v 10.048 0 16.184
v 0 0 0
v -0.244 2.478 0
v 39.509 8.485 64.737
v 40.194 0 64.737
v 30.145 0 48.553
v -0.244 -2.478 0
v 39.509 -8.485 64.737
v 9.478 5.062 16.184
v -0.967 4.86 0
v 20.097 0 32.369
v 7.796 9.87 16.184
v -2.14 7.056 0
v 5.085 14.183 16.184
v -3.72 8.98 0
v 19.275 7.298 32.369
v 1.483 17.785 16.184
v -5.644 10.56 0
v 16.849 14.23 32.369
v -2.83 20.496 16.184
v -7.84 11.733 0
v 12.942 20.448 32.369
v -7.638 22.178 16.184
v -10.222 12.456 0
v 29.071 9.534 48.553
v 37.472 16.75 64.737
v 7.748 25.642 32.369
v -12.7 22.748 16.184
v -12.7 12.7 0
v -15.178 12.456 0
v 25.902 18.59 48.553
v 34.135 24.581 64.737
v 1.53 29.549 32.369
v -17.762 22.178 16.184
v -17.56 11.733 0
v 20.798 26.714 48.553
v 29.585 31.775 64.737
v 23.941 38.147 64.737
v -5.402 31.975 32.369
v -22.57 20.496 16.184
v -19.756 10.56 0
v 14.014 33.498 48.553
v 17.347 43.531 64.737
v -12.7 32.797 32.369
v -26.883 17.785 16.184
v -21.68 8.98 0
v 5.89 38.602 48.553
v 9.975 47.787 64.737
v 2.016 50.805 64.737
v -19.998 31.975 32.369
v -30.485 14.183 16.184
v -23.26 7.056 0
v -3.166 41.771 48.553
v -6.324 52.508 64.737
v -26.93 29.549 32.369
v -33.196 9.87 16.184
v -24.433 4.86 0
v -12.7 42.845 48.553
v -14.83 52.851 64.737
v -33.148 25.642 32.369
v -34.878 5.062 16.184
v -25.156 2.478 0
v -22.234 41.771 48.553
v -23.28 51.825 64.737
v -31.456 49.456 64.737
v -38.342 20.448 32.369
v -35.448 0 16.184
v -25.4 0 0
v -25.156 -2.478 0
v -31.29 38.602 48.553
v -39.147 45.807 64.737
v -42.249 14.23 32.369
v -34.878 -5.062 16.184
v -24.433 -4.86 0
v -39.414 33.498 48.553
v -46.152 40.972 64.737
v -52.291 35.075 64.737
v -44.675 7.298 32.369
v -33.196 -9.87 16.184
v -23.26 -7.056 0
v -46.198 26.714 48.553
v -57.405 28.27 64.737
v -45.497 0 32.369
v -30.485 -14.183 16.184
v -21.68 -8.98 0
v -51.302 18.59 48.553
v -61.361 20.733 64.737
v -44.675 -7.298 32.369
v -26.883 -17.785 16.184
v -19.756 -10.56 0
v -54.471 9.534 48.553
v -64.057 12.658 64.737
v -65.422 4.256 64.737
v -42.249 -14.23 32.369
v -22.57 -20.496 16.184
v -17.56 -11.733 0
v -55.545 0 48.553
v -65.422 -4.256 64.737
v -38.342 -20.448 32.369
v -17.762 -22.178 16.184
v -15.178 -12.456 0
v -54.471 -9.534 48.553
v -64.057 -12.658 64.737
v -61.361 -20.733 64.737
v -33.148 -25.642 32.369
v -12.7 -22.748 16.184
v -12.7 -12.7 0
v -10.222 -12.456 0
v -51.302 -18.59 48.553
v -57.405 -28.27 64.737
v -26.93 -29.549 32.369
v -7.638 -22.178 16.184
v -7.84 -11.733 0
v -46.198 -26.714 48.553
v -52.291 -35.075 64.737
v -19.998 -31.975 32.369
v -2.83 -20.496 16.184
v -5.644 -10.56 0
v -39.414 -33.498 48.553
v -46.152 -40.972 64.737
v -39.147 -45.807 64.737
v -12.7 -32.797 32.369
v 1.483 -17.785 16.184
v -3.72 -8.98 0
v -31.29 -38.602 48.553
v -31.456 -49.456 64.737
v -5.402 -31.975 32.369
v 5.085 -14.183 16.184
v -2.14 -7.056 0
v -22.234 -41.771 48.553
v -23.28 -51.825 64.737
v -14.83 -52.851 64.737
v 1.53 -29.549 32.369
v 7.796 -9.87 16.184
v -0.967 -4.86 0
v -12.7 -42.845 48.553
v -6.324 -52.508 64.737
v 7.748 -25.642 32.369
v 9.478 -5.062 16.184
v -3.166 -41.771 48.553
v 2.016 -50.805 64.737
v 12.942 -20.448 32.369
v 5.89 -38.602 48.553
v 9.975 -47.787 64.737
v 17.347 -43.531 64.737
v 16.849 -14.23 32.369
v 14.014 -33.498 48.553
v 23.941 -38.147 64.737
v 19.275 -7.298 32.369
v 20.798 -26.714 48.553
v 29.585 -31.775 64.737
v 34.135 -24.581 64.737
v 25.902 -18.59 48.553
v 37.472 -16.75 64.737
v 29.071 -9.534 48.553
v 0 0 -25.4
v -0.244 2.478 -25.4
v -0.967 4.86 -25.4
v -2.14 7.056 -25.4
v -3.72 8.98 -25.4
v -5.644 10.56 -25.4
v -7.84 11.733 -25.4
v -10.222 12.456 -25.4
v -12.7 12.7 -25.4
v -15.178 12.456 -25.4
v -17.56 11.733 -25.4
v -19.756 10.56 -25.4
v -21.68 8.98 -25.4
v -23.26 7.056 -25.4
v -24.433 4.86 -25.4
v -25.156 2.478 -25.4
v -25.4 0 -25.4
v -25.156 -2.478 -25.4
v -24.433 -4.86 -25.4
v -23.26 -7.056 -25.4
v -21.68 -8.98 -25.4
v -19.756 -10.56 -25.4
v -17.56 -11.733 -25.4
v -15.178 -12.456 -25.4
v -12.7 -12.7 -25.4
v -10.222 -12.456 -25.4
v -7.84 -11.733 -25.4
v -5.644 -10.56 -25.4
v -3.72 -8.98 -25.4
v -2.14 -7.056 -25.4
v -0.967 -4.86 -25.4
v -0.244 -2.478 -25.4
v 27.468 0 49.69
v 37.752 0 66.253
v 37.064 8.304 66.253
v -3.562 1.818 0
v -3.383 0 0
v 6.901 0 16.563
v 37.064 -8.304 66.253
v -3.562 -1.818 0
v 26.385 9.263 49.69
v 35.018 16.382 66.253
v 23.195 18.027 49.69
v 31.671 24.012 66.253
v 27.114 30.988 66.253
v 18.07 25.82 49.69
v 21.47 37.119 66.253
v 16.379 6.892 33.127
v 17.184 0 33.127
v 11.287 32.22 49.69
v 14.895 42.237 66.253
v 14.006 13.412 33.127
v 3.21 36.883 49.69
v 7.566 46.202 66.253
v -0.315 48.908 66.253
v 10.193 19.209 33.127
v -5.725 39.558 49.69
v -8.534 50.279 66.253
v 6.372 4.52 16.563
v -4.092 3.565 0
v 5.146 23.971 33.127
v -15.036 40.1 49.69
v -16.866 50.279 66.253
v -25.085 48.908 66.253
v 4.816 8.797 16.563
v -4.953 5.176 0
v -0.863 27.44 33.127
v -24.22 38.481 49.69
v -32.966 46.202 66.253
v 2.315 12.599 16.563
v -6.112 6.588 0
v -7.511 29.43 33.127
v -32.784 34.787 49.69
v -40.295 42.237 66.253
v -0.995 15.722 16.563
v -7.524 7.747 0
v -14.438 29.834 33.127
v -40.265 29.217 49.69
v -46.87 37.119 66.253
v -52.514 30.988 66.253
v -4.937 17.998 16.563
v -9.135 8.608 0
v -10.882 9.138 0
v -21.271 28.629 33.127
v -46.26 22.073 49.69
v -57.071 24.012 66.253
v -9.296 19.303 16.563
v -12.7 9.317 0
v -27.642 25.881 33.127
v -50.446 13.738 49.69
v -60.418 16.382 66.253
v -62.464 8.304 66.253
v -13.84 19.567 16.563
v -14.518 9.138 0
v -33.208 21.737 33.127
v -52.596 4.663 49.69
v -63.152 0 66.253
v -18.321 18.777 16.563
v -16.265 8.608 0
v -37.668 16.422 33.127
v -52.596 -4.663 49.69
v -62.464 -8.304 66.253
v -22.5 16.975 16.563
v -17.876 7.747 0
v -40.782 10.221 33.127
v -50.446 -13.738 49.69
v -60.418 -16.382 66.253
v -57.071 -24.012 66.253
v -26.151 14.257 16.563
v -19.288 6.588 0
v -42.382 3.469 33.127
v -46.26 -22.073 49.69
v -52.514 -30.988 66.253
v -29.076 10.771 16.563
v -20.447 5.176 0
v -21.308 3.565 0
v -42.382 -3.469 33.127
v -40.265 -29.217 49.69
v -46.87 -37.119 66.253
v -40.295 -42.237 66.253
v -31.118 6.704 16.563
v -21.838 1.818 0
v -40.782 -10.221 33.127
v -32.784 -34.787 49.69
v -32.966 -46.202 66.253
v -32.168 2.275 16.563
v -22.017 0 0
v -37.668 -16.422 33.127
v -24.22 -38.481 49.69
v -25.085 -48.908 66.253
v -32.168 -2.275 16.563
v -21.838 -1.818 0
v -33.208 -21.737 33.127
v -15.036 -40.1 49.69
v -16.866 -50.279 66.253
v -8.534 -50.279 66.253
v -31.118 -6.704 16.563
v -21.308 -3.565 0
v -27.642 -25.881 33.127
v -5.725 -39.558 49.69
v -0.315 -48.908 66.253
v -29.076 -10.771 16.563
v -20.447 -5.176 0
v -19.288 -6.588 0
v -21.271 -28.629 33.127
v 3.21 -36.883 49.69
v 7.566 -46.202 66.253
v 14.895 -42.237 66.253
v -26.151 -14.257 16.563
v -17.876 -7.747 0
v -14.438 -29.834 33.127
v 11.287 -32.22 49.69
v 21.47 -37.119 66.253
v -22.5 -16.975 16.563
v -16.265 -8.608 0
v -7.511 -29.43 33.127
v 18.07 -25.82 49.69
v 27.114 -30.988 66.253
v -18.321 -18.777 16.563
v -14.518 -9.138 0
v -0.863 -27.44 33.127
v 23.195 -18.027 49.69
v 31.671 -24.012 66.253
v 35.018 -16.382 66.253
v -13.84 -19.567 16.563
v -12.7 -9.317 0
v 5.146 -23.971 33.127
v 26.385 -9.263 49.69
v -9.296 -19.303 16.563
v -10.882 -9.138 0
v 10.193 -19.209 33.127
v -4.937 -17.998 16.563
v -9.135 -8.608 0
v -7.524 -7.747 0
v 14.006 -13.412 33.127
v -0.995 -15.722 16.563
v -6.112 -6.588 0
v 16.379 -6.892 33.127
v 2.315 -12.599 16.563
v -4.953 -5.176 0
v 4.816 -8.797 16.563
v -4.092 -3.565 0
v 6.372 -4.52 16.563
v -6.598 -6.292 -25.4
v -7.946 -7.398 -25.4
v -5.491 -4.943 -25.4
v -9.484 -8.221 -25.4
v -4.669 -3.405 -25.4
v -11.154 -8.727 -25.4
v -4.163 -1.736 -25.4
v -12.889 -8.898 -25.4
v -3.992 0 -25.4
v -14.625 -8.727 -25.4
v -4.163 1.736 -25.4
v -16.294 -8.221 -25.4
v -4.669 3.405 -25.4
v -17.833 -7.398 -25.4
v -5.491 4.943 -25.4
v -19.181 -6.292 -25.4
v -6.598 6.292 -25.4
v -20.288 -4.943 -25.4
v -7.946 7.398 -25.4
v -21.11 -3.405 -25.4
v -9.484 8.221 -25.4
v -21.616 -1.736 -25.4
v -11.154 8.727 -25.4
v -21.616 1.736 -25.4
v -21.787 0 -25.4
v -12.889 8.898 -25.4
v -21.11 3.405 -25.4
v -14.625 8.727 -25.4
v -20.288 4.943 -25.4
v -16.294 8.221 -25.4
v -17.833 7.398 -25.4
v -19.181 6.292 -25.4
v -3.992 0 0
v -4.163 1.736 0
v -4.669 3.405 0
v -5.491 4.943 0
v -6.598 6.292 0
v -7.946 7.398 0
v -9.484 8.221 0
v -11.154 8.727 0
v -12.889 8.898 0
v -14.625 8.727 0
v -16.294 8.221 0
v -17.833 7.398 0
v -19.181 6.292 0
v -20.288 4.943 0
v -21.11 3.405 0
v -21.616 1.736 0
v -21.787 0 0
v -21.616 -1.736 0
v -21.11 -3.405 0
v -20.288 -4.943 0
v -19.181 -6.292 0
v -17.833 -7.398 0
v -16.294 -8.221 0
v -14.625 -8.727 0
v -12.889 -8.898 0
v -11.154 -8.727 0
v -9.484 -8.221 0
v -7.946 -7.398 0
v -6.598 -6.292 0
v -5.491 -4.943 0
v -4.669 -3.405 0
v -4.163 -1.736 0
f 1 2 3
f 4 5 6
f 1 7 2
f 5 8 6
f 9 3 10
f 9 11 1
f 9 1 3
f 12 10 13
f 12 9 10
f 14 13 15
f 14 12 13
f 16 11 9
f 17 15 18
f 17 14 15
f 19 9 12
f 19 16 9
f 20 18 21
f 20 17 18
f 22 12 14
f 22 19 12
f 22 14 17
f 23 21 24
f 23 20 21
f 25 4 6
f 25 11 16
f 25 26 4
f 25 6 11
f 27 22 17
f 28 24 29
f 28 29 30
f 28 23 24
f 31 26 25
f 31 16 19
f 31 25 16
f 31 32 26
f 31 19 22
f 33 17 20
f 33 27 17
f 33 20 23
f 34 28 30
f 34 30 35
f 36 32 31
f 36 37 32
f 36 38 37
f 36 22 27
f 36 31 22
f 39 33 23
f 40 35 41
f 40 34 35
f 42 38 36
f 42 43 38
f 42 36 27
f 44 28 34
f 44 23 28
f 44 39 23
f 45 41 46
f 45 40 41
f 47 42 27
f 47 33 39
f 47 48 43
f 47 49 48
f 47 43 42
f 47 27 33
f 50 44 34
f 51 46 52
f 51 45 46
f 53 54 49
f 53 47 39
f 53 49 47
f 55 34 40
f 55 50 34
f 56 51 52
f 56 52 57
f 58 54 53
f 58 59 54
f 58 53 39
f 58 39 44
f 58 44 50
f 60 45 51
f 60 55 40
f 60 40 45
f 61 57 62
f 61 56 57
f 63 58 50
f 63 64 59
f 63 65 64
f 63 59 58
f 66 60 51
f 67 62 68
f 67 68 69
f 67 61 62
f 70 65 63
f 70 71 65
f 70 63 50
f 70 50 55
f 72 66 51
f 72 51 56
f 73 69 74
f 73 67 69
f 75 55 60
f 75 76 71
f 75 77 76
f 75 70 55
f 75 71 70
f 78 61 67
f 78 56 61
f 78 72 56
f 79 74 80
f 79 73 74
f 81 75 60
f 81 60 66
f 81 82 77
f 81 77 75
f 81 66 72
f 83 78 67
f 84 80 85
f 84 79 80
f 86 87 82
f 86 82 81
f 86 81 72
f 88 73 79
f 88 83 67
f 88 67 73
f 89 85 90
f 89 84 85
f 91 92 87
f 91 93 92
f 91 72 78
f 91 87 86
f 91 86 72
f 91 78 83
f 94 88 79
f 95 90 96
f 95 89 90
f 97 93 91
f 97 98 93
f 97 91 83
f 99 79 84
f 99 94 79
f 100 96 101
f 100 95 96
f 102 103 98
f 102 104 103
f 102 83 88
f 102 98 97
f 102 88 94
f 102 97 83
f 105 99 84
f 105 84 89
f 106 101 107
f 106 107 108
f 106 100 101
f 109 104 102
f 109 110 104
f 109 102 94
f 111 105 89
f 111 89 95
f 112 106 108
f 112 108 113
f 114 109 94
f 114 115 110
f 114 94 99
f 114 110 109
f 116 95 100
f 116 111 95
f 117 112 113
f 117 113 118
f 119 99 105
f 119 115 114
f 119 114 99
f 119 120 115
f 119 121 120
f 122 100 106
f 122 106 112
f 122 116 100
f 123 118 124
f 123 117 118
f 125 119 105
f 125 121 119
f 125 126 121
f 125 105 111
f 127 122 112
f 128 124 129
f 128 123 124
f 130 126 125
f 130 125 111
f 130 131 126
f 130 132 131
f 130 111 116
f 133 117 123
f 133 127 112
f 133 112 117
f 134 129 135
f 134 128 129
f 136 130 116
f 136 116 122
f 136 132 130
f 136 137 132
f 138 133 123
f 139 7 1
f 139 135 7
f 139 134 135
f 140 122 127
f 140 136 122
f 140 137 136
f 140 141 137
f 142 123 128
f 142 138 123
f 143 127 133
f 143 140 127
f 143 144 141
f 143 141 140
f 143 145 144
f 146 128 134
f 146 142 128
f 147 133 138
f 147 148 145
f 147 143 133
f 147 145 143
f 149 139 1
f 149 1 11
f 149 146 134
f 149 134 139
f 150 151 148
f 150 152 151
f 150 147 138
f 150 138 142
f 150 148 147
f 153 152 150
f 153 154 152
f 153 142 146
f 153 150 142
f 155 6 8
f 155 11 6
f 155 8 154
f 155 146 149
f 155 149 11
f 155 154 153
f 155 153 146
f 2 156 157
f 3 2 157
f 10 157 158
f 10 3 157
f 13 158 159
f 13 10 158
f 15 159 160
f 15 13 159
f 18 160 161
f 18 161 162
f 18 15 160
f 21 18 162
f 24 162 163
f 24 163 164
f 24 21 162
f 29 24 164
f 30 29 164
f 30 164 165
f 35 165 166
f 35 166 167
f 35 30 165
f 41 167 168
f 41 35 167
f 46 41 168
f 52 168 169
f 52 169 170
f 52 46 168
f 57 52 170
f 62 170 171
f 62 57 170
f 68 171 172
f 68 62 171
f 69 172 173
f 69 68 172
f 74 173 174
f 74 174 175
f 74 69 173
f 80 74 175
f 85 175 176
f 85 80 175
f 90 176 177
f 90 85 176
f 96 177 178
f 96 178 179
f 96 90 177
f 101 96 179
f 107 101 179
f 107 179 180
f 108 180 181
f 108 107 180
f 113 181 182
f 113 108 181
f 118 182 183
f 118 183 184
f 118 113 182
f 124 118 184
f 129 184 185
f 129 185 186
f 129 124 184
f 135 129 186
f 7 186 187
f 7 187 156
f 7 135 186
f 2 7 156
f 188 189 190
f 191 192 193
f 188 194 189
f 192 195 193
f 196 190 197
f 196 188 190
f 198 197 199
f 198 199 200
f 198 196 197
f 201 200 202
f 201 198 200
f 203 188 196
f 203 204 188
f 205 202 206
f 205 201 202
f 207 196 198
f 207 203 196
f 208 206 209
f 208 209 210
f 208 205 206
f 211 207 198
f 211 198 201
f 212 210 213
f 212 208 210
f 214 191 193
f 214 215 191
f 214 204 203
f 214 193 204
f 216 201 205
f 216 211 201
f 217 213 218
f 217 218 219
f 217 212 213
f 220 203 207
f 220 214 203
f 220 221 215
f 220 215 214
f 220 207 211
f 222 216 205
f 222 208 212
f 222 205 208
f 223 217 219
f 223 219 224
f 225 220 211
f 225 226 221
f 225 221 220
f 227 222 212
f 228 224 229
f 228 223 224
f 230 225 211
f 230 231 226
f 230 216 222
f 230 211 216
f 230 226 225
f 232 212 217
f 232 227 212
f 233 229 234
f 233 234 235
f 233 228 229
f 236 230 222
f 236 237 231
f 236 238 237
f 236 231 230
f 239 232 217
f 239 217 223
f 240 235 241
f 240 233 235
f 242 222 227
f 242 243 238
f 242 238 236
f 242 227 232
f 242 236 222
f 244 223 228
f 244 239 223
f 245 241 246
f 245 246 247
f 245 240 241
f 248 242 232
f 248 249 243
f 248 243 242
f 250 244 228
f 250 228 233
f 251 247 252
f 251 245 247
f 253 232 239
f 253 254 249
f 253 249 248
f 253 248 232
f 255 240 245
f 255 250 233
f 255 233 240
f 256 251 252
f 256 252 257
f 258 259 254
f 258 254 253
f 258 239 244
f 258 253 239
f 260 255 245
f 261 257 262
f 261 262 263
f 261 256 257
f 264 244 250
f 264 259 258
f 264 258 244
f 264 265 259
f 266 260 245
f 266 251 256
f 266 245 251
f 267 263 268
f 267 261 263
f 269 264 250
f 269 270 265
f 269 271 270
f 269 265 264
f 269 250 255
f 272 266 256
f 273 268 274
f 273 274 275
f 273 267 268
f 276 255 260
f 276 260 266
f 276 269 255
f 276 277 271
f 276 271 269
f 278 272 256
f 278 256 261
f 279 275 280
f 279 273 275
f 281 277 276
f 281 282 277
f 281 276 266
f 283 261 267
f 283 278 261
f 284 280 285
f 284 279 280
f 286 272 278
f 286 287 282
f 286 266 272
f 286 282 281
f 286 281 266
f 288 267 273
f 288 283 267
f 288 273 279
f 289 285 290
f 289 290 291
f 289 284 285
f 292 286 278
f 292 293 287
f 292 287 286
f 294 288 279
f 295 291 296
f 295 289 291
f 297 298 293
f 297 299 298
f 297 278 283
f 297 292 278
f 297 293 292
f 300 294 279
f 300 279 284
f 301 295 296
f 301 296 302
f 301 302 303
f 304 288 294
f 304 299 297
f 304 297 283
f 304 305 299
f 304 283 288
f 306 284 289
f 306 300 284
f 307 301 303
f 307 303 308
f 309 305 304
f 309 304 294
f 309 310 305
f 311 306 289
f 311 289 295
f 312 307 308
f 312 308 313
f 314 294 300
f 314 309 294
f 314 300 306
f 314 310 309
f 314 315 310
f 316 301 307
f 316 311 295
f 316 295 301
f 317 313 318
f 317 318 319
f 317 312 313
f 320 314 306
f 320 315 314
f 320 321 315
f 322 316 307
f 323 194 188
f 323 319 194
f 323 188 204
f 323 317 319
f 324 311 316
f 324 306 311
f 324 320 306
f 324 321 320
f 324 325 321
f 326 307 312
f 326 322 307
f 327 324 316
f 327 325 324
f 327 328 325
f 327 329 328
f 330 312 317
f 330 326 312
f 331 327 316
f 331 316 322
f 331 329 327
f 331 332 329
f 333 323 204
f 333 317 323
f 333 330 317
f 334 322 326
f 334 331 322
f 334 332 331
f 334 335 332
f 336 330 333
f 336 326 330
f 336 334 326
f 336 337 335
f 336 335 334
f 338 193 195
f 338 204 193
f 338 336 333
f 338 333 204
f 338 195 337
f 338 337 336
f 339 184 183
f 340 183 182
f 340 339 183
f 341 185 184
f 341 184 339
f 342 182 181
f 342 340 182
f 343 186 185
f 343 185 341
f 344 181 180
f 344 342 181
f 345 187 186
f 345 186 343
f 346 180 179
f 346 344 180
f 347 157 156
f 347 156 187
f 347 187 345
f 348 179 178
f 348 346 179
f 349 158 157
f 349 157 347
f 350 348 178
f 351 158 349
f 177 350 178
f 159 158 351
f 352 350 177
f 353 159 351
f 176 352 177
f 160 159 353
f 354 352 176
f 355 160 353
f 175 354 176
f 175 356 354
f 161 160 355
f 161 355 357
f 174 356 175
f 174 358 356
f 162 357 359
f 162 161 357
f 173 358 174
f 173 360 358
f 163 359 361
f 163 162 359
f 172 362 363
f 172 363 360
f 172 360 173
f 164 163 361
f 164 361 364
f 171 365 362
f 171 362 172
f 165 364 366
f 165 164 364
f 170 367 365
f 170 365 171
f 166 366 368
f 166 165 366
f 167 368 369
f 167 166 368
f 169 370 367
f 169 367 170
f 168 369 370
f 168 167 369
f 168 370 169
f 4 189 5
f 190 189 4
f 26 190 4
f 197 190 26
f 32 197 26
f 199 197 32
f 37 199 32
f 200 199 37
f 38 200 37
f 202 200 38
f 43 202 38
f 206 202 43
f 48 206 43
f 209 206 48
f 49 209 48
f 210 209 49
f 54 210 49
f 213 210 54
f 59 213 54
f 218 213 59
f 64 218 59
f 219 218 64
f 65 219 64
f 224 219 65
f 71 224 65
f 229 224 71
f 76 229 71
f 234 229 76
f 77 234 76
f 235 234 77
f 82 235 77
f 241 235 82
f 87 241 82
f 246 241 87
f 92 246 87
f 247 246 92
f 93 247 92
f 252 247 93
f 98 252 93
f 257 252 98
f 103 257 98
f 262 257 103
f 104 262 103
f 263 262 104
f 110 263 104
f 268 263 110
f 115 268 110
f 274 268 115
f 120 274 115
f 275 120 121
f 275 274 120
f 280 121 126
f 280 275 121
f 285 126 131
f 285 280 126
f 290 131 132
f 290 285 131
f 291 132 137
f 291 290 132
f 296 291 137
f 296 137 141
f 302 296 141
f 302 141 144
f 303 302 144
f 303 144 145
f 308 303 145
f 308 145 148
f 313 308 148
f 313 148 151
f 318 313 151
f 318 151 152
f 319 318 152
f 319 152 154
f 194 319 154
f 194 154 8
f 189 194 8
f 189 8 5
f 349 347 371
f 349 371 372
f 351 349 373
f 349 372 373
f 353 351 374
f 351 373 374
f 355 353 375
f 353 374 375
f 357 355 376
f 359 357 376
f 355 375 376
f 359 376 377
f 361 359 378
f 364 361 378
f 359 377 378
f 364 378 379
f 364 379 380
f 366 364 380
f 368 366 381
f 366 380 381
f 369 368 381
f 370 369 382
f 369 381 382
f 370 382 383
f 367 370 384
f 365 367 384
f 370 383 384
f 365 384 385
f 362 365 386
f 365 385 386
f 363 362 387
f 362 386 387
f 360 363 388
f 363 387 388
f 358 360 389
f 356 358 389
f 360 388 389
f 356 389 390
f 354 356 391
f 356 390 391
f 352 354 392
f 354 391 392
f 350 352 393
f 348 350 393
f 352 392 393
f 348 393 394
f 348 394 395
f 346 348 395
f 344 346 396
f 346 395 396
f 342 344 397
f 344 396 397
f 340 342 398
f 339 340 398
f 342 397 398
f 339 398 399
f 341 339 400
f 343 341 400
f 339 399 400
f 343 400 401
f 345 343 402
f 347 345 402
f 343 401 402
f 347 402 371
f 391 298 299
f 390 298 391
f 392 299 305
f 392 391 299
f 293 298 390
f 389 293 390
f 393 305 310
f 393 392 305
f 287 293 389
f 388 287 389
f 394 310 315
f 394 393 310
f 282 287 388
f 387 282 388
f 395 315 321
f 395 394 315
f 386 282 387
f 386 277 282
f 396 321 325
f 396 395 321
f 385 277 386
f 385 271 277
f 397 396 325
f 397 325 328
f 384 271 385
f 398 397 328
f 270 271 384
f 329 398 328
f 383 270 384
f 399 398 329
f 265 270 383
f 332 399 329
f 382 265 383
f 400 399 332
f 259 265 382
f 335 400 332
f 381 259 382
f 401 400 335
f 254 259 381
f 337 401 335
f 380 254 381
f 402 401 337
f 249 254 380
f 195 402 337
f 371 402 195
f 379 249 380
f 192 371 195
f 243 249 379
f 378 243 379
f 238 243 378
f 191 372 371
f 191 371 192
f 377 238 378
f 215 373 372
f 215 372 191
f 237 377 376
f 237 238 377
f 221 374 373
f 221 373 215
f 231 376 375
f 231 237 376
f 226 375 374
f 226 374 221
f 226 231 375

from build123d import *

# Parameters (mm, degrees)
F2_R     = 7.582506
F3_DEPTH = 25.4
F4_R     = 8.897852
F5_DEPTH = 25.4


with BuildPart() as f1:
    # F0 (on Front) → F1 (revolve)
    with BuildSketch(Plane.XZ):
        Polygon((0, -25.4), (0, 0), (40.193673, 64.737228), (37.751768, 66.253343), (-3.383222, 0), (-12.7, 0), (-12.7, -25.4), align=None)
    revolve(axis=Axis((-12.7, 0, -12.7), (0, 0, 1)))

    # F2 (on face) → F3 (cut)
    with BuildSketch(Plane.XY):
        with Locations((-12.7, 0)):
            Circle(F2_R)
    extrude(amount=-F3_DEPTH, mode=Mode.SUBTRACT)

    # F4 (on Top) → F5 (cut)
    with BuildSketch(Plane.XY):
        with Locations((-12.889439, 0)):
            Circle(F4_R)
    extrude(amount=-F5_DEPTH, mode=Mode.SUBTRACT)


solid = f1.part
